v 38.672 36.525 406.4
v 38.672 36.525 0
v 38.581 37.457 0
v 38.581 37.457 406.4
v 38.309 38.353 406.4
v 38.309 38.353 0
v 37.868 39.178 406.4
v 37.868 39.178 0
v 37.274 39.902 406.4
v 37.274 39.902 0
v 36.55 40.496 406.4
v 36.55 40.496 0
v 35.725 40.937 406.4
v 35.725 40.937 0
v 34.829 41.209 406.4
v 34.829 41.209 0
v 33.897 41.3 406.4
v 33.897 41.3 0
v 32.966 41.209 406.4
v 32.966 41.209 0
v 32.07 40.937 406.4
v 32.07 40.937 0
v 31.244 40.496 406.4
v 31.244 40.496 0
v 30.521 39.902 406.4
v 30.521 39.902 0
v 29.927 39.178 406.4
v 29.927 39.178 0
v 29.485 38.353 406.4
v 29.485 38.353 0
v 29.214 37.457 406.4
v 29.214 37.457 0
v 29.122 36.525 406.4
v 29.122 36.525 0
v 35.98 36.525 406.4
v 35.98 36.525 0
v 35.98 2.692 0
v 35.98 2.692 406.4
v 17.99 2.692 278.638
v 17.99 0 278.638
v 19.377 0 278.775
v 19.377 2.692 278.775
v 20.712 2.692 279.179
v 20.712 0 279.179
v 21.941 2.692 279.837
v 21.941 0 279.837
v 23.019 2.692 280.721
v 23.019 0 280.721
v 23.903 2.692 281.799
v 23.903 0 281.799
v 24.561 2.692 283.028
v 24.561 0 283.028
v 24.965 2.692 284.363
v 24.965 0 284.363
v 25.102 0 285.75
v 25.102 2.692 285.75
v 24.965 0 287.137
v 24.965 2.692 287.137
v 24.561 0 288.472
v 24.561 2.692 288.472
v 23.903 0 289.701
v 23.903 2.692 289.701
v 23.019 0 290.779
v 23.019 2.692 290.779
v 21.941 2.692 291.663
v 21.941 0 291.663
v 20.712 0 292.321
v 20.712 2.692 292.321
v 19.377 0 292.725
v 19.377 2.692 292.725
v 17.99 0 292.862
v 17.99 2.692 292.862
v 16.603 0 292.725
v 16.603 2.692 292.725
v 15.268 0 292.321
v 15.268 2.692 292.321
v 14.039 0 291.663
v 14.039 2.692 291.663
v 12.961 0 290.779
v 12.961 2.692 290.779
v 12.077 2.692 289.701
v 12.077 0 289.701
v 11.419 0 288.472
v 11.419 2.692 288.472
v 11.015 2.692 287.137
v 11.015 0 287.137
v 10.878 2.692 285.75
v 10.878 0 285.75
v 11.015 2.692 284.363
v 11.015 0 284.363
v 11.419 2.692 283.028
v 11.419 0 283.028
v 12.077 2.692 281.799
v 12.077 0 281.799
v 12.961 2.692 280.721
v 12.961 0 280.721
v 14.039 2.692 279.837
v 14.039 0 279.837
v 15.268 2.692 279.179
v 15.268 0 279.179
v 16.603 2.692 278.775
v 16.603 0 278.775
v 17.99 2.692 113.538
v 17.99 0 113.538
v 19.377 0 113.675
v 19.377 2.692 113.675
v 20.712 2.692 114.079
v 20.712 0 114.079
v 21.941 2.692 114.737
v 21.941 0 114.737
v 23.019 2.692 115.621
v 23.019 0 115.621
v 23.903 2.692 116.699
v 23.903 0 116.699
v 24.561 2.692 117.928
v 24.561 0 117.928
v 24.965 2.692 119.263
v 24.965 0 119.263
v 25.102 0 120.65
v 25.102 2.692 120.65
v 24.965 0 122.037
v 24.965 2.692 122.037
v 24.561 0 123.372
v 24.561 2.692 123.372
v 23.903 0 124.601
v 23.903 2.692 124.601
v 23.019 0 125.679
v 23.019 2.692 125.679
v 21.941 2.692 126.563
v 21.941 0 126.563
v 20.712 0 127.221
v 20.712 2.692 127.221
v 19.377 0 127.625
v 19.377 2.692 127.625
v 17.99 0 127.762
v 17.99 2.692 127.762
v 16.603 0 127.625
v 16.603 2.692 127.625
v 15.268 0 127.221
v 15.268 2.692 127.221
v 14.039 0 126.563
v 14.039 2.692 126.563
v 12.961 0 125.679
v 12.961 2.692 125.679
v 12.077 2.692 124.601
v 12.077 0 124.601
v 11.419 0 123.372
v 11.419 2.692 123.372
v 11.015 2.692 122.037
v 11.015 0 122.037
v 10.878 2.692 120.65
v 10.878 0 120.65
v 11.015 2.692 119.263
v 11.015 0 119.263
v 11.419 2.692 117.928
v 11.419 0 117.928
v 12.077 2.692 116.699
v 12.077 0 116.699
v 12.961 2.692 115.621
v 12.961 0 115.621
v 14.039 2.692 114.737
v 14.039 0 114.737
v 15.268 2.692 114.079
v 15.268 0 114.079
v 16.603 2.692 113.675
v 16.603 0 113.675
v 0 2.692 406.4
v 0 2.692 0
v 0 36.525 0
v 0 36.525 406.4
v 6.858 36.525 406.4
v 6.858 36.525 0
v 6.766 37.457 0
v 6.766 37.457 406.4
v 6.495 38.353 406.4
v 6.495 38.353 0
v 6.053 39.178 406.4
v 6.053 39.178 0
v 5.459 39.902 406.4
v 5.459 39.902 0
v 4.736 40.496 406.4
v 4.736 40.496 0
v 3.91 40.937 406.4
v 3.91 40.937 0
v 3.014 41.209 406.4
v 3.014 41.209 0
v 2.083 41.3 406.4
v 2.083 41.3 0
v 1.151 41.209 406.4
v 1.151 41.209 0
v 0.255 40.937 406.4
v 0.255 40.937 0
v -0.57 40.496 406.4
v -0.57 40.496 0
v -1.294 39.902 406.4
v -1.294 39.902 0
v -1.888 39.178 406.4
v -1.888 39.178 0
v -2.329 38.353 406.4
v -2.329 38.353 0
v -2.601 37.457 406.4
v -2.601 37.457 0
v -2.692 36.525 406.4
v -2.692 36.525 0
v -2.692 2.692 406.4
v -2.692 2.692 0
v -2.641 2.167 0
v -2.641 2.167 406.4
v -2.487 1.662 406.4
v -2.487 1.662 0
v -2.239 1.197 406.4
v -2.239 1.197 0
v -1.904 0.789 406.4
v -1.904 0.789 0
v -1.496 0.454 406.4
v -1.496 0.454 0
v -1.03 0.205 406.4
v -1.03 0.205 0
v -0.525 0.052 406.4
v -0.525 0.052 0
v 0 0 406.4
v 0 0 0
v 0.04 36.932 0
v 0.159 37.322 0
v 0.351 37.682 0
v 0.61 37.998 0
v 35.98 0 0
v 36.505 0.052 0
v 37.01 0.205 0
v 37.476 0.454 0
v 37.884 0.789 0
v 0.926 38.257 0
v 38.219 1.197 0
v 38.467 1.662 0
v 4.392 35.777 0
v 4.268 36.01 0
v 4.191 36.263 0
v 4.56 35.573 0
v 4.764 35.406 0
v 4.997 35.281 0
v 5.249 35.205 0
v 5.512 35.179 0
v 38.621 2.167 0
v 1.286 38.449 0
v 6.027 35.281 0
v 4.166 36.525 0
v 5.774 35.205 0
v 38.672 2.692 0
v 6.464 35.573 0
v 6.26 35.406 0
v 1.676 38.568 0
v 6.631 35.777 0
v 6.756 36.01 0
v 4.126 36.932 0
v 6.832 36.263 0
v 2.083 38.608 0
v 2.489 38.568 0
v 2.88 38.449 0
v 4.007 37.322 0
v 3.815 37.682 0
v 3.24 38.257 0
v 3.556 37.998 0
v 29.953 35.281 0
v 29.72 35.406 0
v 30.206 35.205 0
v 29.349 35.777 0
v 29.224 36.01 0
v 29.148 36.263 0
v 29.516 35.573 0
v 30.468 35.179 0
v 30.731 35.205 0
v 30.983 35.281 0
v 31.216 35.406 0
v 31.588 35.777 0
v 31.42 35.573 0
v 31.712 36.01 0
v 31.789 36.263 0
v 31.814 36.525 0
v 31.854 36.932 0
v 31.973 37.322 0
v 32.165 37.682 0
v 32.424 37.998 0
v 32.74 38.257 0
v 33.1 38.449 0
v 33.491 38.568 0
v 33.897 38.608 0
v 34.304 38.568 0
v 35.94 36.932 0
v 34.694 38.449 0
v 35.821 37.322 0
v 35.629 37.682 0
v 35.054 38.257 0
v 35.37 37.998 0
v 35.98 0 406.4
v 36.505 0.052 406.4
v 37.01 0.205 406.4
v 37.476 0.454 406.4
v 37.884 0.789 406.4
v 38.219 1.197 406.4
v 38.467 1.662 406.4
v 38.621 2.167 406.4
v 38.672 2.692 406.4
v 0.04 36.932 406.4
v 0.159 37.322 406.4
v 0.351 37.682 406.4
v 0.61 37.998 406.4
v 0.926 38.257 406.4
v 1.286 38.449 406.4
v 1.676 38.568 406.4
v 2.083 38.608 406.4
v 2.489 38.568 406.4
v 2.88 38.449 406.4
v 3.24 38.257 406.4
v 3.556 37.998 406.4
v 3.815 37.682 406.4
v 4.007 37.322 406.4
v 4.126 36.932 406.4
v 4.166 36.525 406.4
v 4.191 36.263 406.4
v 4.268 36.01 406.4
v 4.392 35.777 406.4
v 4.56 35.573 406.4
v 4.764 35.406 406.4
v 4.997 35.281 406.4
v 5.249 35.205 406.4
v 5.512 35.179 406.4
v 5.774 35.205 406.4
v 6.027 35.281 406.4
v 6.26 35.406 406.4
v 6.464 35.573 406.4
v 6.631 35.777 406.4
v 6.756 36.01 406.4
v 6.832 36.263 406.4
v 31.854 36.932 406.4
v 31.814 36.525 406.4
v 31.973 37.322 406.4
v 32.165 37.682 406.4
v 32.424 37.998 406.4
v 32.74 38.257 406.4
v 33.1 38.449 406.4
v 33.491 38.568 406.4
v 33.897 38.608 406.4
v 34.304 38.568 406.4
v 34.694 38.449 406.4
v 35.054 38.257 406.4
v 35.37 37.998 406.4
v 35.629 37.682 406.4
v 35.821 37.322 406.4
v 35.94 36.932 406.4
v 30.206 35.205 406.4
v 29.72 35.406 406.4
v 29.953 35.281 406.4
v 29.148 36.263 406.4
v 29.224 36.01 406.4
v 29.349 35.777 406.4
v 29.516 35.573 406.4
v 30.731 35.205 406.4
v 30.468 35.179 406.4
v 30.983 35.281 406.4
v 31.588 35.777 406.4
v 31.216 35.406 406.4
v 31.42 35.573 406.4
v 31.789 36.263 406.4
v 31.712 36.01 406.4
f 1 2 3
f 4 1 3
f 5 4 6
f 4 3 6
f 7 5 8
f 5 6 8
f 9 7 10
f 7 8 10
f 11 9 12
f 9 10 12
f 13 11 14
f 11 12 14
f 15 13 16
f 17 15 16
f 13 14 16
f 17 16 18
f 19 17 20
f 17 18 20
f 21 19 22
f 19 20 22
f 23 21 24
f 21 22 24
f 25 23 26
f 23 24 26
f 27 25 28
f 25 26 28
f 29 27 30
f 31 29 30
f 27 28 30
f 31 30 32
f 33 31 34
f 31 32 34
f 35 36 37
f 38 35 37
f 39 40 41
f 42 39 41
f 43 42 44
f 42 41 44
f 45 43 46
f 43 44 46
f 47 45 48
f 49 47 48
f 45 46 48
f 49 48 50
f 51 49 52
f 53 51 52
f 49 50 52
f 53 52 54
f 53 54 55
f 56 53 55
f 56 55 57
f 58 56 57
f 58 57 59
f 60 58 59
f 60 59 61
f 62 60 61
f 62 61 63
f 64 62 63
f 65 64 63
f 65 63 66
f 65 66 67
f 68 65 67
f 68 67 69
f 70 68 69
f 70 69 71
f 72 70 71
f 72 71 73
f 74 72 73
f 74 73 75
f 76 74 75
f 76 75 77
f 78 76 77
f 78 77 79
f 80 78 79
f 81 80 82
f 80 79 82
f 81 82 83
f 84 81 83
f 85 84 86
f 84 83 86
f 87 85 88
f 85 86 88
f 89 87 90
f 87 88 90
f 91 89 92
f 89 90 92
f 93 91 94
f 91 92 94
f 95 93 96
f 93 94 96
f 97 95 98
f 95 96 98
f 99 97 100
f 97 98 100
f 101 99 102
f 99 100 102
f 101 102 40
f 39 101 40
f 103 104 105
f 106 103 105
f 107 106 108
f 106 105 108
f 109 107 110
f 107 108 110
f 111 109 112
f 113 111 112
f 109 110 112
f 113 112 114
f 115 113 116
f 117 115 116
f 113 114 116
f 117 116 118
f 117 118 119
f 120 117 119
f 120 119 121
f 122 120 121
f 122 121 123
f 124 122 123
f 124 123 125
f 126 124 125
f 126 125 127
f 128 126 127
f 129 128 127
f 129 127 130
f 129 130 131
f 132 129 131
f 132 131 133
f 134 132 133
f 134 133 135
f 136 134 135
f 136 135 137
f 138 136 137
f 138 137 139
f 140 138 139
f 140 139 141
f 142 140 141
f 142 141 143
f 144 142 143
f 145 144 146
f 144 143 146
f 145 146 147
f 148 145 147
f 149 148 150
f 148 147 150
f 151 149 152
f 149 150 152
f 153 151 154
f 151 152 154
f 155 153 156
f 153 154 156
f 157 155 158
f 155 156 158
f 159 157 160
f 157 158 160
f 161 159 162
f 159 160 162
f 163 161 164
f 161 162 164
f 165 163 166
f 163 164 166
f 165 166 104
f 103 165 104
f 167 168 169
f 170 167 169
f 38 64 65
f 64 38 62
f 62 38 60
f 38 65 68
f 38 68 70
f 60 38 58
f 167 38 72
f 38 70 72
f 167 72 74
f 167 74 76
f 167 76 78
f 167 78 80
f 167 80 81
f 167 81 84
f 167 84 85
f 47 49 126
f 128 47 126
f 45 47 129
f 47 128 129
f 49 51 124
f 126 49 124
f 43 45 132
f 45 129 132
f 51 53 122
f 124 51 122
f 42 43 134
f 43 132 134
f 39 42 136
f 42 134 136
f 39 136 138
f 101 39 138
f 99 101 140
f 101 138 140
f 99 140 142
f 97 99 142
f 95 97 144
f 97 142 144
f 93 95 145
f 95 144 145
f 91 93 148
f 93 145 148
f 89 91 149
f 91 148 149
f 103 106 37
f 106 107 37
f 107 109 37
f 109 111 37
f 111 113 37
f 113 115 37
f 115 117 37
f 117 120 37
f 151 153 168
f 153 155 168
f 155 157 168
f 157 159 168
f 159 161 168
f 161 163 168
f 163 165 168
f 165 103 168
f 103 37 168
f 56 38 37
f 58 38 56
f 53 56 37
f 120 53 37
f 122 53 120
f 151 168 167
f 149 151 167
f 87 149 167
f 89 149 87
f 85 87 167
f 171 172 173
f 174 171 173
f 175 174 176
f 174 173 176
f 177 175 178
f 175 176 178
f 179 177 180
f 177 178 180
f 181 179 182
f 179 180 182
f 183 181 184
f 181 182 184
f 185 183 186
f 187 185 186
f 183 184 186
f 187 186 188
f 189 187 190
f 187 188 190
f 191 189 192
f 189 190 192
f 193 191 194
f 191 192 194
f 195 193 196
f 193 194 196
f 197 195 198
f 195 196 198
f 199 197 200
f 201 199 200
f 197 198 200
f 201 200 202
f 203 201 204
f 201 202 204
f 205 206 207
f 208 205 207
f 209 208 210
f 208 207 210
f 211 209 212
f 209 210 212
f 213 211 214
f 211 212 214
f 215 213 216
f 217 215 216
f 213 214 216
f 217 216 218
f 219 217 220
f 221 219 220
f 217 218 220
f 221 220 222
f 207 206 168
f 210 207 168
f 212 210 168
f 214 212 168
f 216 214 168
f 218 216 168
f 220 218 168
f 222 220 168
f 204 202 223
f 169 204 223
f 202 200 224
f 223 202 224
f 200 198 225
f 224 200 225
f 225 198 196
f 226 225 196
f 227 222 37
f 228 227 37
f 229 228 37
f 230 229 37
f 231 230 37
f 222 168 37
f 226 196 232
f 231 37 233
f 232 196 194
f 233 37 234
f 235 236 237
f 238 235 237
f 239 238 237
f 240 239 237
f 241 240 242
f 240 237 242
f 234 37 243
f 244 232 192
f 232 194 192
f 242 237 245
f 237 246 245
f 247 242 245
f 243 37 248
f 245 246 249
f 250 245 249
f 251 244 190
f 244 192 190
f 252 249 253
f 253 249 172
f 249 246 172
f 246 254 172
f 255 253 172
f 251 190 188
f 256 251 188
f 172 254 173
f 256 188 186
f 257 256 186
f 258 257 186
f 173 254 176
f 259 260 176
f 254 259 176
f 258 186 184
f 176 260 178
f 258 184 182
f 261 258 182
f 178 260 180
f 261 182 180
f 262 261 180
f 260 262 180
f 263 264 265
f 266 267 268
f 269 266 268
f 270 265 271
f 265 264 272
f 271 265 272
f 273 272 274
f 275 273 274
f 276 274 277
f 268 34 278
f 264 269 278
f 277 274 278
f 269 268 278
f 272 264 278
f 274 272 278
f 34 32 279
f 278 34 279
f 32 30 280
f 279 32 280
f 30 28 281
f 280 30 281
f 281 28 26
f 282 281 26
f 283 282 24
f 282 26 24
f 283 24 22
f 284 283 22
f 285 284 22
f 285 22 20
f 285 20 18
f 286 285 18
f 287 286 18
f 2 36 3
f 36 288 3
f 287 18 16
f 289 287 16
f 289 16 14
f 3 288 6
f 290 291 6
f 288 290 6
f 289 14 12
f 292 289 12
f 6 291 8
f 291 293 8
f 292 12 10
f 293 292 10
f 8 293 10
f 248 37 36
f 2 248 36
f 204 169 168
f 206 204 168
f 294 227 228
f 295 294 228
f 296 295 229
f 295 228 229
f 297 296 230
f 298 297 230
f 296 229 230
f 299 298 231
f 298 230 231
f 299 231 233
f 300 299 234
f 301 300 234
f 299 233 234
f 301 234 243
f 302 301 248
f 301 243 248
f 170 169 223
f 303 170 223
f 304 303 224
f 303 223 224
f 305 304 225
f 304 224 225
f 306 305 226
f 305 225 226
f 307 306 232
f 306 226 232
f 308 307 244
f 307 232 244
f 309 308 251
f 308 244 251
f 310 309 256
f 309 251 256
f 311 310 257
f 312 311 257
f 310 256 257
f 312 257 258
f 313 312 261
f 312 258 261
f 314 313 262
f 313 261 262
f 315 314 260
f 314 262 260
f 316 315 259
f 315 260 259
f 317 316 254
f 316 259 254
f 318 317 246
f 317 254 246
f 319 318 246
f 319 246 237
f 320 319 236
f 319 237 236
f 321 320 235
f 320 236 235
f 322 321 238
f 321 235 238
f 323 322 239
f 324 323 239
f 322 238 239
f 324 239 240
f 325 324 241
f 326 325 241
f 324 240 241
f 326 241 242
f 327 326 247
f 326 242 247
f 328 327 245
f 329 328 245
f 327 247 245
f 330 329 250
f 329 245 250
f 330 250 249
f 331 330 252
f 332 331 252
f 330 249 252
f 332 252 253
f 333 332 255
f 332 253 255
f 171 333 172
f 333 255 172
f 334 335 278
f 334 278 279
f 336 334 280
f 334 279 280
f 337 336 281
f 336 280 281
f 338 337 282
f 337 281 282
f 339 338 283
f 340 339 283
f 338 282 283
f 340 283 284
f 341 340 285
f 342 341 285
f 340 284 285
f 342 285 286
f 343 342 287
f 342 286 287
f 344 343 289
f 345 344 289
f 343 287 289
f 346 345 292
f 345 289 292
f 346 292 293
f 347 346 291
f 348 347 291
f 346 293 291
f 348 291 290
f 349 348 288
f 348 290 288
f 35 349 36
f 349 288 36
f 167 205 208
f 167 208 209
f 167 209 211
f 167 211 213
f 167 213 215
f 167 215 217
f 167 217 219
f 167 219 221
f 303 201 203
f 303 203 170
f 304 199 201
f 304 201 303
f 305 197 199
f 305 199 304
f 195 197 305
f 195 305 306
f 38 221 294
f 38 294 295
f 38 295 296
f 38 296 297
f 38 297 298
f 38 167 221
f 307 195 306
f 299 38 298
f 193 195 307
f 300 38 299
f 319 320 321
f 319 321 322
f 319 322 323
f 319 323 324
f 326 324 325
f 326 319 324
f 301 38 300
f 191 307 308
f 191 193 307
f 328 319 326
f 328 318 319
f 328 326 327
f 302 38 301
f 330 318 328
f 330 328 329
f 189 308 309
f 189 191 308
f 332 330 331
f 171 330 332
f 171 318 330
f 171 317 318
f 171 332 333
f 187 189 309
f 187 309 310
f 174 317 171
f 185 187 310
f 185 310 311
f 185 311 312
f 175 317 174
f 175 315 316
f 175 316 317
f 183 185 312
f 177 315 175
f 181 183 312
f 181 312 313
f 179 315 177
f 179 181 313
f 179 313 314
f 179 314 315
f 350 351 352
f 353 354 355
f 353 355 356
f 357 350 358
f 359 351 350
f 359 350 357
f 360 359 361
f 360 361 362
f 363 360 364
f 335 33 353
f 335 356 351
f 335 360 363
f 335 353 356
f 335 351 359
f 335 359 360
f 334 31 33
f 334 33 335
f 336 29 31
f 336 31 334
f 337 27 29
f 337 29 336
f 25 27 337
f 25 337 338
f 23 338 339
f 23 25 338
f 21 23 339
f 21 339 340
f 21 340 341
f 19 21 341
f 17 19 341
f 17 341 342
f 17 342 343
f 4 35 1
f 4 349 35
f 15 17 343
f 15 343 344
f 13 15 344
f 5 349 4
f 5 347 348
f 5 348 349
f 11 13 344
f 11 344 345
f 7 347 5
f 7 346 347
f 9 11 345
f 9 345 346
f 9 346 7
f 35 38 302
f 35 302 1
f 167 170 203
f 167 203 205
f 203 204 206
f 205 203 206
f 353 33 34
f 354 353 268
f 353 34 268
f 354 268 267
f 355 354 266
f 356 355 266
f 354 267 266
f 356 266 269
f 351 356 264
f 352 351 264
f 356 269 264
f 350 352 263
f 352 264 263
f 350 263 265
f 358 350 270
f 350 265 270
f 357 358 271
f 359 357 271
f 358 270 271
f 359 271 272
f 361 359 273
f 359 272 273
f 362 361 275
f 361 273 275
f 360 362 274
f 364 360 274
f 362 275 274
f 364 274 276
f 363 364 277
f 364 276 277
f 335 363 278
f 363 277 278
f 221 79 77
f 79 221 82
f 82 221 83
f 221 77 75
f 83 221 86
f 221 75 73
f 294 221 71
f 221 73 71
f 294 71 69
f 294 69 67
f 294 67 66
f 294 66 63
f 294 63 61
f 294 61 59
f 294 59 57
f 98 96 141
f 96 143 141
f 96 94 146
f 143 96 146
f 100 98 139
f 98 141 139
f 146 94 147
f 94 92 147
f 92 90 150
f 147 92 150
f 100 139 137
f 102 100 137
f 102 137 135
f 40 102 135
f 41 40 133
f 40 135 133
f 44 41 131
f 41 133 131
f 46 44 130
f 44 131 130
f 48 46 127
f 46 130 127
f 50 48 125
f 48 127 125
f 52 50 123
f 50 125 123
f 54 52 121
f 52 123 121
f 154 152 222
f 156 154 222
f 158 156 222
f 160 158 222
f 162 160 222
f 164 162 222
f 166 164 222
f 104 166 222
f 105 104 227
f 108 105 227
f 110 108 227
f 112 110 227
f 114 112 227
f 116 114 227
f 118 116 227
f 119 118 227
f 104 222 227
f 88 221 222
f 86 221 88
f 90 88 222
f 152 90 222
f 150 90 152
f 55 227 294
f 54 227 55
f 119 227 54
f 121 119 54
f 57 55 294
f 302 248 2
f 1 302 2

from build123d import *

# Parameters (mm, degrees)
EXTRUDE_1_DEPTH     = 406.4
SKETCH_2_R          = 7.112
CUT_EXTRUDE_1_DEPTH = 411.319677278


with BuildPart() as part:
    # 草图1 → 凸台-拉伸1 (new body)
    with BuildSketch(Plane.XY):
        with BuildLine():
            Line((0, 0), (35.98, 0))
            ThreePointArc((35.98, 0), (37.883814298, 0.788585702), (38.6724, 2.6924))
            Line((38.6724, 2.6924), (38.6724, 36.5252))
            ThreePointArc((38.6724, 36.5252), (33.8972, 41.3004), (29.122, 36.5252))
            ThreePointArc((29.122, 36.5252), (30.4682, 35.179), (31.8144, 36.5252))
            ThreePointArc((31.8144, 36.5252), (33.8972, 38.608), (35.98, 36.5252))
            Line((35.98, 36.5252), (35.98, 2.6924))
            Line((35.98, 2.6924), (0, 2.6924))
            Line((0, 2.6924), (0, 36.5252))
            ThreePointArc((0, 36.5252), (2.0828, 38.608), (4.1656, 36.5252))
            ThreePointArc((4.1656, 36.5252), (5.5118, 35.179), (6.858, 36.5252))
            ThreePointArc((6.858, 36.5252), (2.0828, 41.3004), (-2.6924, 36.5252))
            Line((-2.6924, 36.5252), (-2.6924, 2.6924))
            ThreePointArc((-2.6924, 2.6924), (-1.903814298, 0.788585702), (0, 0))
        make_face()
    extrude(amount=EXTRUDE_1_DEPTH)

    # 草图2 → 切除-拉伸1 (cut, through all)
    with BuildSketch(Plane(origin=(0, 0, 0), x_dir=(-1, 0, 0), z_dir=(0, -1, 0))):
        with Locations(Location((-17.99, -120.65, 0), (0, 0, 90))):
            Circle(SKETCH_2_R)
        with Locations(Location((-17.99, -285.75, 0), (0, 0, 90))):
            Circle(SKETCH_2_R)
    extrude(amount=-CUT_EXTRUDE_1_DEPTH, mode=Mode.SUBTRACT)


solid = part.part
